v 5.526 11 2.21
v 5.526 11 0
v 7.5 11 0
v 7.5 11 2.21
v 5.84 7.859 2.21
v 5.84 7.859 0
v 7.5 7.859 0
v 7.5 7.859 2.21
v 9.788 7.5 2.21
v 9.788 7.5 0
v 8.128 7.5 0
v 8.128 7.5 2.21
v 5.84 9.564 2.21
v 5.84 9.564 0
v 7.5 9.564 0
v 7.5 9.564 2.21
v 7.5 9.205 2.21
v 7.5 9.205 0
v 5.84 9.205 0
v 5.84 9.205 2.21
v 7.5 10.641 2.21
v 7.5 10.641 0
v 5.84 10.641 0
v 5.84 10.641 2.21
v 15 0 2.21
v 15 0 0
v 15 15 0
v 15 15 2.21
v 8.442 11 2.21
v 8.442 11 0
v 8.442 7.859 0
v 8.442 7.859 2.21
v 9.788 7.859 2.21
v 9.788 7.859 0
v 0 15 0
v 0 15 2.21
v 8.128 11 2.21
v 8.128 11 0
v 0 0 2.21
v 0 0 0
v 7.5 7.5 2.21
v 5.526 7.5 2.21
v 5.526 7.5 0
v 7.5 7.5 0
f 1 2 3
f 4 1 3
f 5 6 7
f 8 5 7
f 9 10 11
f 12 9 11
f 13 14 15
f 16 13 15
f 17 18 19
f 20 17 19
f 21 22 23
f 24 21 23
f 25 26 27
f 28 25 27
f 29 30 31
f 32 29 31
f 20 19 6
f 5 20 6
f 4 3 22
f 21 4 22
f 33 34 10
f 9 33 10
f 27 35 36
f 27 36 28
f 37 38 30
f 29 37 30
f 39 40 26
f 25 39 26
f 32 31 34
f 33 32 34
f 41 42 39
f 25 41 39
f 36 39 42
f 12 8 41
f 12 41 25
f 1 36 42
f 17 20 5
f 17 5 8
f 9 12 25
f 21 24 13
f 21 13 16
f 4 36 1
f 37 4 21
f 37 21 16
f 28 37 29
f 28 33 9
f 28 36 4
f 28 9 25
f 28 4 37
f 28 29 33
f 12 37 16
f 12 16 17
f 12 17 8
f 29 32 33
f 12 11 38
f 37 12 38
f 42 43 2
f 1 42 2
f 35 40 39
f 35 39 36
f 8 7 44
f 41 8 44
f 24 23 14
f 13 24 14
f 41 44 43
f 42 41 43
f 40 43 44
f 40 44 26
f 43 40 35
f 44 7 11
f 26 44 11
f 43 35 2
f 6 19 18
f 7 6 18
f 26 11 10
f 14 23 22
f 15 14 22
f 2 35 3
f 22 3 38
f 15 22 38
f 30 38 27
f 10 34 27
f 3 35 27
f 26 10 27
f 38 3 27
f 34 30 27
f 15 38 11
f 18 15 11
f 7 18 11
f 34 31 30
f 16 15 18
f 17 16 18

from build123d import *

# Parameters (mm, degrees)
SKETCH1_W           = 15
SKETCH1_H           = 15
BOSS_EXTRUDE1_DEPTH = 2.21


with BuildPart() as part:
    # Sketch1 → Boss-Extrude1 (new body)
    with BuildSketch(Plane.XY):
        with Locations((7.5, 7.5)):
            Rectangle(SKETCH1_W, SKETCH1_H)
        Polygon((5.525641026, 11), (7.5, 11), (7.5, 10.641025641), (5.83974359, 10.641025641), (5.83974359, 9.564102564), (7.5, 9.564102564), (7.5, 9.205128205), (5.83974359, 9.205128205), (5.83974359, 7.858974359), (7.5, 7.858974359), (7.5, 7.5), (5.525641026, 7.5), align=None, mode=Mode.SUBTRACT)
        Polygon((8.128205128, 11), (8.442307692, 11), (8.442307692, 7.858974359), (9.788461538, 7.858974359), (9.788461538, 7.5), (8.128205128, 7.5), align=None, mode=Mode.SUBTRACT)
    extrude(amount=BOSS_EXTRUDE1_DEPTH)


solid = part.part
